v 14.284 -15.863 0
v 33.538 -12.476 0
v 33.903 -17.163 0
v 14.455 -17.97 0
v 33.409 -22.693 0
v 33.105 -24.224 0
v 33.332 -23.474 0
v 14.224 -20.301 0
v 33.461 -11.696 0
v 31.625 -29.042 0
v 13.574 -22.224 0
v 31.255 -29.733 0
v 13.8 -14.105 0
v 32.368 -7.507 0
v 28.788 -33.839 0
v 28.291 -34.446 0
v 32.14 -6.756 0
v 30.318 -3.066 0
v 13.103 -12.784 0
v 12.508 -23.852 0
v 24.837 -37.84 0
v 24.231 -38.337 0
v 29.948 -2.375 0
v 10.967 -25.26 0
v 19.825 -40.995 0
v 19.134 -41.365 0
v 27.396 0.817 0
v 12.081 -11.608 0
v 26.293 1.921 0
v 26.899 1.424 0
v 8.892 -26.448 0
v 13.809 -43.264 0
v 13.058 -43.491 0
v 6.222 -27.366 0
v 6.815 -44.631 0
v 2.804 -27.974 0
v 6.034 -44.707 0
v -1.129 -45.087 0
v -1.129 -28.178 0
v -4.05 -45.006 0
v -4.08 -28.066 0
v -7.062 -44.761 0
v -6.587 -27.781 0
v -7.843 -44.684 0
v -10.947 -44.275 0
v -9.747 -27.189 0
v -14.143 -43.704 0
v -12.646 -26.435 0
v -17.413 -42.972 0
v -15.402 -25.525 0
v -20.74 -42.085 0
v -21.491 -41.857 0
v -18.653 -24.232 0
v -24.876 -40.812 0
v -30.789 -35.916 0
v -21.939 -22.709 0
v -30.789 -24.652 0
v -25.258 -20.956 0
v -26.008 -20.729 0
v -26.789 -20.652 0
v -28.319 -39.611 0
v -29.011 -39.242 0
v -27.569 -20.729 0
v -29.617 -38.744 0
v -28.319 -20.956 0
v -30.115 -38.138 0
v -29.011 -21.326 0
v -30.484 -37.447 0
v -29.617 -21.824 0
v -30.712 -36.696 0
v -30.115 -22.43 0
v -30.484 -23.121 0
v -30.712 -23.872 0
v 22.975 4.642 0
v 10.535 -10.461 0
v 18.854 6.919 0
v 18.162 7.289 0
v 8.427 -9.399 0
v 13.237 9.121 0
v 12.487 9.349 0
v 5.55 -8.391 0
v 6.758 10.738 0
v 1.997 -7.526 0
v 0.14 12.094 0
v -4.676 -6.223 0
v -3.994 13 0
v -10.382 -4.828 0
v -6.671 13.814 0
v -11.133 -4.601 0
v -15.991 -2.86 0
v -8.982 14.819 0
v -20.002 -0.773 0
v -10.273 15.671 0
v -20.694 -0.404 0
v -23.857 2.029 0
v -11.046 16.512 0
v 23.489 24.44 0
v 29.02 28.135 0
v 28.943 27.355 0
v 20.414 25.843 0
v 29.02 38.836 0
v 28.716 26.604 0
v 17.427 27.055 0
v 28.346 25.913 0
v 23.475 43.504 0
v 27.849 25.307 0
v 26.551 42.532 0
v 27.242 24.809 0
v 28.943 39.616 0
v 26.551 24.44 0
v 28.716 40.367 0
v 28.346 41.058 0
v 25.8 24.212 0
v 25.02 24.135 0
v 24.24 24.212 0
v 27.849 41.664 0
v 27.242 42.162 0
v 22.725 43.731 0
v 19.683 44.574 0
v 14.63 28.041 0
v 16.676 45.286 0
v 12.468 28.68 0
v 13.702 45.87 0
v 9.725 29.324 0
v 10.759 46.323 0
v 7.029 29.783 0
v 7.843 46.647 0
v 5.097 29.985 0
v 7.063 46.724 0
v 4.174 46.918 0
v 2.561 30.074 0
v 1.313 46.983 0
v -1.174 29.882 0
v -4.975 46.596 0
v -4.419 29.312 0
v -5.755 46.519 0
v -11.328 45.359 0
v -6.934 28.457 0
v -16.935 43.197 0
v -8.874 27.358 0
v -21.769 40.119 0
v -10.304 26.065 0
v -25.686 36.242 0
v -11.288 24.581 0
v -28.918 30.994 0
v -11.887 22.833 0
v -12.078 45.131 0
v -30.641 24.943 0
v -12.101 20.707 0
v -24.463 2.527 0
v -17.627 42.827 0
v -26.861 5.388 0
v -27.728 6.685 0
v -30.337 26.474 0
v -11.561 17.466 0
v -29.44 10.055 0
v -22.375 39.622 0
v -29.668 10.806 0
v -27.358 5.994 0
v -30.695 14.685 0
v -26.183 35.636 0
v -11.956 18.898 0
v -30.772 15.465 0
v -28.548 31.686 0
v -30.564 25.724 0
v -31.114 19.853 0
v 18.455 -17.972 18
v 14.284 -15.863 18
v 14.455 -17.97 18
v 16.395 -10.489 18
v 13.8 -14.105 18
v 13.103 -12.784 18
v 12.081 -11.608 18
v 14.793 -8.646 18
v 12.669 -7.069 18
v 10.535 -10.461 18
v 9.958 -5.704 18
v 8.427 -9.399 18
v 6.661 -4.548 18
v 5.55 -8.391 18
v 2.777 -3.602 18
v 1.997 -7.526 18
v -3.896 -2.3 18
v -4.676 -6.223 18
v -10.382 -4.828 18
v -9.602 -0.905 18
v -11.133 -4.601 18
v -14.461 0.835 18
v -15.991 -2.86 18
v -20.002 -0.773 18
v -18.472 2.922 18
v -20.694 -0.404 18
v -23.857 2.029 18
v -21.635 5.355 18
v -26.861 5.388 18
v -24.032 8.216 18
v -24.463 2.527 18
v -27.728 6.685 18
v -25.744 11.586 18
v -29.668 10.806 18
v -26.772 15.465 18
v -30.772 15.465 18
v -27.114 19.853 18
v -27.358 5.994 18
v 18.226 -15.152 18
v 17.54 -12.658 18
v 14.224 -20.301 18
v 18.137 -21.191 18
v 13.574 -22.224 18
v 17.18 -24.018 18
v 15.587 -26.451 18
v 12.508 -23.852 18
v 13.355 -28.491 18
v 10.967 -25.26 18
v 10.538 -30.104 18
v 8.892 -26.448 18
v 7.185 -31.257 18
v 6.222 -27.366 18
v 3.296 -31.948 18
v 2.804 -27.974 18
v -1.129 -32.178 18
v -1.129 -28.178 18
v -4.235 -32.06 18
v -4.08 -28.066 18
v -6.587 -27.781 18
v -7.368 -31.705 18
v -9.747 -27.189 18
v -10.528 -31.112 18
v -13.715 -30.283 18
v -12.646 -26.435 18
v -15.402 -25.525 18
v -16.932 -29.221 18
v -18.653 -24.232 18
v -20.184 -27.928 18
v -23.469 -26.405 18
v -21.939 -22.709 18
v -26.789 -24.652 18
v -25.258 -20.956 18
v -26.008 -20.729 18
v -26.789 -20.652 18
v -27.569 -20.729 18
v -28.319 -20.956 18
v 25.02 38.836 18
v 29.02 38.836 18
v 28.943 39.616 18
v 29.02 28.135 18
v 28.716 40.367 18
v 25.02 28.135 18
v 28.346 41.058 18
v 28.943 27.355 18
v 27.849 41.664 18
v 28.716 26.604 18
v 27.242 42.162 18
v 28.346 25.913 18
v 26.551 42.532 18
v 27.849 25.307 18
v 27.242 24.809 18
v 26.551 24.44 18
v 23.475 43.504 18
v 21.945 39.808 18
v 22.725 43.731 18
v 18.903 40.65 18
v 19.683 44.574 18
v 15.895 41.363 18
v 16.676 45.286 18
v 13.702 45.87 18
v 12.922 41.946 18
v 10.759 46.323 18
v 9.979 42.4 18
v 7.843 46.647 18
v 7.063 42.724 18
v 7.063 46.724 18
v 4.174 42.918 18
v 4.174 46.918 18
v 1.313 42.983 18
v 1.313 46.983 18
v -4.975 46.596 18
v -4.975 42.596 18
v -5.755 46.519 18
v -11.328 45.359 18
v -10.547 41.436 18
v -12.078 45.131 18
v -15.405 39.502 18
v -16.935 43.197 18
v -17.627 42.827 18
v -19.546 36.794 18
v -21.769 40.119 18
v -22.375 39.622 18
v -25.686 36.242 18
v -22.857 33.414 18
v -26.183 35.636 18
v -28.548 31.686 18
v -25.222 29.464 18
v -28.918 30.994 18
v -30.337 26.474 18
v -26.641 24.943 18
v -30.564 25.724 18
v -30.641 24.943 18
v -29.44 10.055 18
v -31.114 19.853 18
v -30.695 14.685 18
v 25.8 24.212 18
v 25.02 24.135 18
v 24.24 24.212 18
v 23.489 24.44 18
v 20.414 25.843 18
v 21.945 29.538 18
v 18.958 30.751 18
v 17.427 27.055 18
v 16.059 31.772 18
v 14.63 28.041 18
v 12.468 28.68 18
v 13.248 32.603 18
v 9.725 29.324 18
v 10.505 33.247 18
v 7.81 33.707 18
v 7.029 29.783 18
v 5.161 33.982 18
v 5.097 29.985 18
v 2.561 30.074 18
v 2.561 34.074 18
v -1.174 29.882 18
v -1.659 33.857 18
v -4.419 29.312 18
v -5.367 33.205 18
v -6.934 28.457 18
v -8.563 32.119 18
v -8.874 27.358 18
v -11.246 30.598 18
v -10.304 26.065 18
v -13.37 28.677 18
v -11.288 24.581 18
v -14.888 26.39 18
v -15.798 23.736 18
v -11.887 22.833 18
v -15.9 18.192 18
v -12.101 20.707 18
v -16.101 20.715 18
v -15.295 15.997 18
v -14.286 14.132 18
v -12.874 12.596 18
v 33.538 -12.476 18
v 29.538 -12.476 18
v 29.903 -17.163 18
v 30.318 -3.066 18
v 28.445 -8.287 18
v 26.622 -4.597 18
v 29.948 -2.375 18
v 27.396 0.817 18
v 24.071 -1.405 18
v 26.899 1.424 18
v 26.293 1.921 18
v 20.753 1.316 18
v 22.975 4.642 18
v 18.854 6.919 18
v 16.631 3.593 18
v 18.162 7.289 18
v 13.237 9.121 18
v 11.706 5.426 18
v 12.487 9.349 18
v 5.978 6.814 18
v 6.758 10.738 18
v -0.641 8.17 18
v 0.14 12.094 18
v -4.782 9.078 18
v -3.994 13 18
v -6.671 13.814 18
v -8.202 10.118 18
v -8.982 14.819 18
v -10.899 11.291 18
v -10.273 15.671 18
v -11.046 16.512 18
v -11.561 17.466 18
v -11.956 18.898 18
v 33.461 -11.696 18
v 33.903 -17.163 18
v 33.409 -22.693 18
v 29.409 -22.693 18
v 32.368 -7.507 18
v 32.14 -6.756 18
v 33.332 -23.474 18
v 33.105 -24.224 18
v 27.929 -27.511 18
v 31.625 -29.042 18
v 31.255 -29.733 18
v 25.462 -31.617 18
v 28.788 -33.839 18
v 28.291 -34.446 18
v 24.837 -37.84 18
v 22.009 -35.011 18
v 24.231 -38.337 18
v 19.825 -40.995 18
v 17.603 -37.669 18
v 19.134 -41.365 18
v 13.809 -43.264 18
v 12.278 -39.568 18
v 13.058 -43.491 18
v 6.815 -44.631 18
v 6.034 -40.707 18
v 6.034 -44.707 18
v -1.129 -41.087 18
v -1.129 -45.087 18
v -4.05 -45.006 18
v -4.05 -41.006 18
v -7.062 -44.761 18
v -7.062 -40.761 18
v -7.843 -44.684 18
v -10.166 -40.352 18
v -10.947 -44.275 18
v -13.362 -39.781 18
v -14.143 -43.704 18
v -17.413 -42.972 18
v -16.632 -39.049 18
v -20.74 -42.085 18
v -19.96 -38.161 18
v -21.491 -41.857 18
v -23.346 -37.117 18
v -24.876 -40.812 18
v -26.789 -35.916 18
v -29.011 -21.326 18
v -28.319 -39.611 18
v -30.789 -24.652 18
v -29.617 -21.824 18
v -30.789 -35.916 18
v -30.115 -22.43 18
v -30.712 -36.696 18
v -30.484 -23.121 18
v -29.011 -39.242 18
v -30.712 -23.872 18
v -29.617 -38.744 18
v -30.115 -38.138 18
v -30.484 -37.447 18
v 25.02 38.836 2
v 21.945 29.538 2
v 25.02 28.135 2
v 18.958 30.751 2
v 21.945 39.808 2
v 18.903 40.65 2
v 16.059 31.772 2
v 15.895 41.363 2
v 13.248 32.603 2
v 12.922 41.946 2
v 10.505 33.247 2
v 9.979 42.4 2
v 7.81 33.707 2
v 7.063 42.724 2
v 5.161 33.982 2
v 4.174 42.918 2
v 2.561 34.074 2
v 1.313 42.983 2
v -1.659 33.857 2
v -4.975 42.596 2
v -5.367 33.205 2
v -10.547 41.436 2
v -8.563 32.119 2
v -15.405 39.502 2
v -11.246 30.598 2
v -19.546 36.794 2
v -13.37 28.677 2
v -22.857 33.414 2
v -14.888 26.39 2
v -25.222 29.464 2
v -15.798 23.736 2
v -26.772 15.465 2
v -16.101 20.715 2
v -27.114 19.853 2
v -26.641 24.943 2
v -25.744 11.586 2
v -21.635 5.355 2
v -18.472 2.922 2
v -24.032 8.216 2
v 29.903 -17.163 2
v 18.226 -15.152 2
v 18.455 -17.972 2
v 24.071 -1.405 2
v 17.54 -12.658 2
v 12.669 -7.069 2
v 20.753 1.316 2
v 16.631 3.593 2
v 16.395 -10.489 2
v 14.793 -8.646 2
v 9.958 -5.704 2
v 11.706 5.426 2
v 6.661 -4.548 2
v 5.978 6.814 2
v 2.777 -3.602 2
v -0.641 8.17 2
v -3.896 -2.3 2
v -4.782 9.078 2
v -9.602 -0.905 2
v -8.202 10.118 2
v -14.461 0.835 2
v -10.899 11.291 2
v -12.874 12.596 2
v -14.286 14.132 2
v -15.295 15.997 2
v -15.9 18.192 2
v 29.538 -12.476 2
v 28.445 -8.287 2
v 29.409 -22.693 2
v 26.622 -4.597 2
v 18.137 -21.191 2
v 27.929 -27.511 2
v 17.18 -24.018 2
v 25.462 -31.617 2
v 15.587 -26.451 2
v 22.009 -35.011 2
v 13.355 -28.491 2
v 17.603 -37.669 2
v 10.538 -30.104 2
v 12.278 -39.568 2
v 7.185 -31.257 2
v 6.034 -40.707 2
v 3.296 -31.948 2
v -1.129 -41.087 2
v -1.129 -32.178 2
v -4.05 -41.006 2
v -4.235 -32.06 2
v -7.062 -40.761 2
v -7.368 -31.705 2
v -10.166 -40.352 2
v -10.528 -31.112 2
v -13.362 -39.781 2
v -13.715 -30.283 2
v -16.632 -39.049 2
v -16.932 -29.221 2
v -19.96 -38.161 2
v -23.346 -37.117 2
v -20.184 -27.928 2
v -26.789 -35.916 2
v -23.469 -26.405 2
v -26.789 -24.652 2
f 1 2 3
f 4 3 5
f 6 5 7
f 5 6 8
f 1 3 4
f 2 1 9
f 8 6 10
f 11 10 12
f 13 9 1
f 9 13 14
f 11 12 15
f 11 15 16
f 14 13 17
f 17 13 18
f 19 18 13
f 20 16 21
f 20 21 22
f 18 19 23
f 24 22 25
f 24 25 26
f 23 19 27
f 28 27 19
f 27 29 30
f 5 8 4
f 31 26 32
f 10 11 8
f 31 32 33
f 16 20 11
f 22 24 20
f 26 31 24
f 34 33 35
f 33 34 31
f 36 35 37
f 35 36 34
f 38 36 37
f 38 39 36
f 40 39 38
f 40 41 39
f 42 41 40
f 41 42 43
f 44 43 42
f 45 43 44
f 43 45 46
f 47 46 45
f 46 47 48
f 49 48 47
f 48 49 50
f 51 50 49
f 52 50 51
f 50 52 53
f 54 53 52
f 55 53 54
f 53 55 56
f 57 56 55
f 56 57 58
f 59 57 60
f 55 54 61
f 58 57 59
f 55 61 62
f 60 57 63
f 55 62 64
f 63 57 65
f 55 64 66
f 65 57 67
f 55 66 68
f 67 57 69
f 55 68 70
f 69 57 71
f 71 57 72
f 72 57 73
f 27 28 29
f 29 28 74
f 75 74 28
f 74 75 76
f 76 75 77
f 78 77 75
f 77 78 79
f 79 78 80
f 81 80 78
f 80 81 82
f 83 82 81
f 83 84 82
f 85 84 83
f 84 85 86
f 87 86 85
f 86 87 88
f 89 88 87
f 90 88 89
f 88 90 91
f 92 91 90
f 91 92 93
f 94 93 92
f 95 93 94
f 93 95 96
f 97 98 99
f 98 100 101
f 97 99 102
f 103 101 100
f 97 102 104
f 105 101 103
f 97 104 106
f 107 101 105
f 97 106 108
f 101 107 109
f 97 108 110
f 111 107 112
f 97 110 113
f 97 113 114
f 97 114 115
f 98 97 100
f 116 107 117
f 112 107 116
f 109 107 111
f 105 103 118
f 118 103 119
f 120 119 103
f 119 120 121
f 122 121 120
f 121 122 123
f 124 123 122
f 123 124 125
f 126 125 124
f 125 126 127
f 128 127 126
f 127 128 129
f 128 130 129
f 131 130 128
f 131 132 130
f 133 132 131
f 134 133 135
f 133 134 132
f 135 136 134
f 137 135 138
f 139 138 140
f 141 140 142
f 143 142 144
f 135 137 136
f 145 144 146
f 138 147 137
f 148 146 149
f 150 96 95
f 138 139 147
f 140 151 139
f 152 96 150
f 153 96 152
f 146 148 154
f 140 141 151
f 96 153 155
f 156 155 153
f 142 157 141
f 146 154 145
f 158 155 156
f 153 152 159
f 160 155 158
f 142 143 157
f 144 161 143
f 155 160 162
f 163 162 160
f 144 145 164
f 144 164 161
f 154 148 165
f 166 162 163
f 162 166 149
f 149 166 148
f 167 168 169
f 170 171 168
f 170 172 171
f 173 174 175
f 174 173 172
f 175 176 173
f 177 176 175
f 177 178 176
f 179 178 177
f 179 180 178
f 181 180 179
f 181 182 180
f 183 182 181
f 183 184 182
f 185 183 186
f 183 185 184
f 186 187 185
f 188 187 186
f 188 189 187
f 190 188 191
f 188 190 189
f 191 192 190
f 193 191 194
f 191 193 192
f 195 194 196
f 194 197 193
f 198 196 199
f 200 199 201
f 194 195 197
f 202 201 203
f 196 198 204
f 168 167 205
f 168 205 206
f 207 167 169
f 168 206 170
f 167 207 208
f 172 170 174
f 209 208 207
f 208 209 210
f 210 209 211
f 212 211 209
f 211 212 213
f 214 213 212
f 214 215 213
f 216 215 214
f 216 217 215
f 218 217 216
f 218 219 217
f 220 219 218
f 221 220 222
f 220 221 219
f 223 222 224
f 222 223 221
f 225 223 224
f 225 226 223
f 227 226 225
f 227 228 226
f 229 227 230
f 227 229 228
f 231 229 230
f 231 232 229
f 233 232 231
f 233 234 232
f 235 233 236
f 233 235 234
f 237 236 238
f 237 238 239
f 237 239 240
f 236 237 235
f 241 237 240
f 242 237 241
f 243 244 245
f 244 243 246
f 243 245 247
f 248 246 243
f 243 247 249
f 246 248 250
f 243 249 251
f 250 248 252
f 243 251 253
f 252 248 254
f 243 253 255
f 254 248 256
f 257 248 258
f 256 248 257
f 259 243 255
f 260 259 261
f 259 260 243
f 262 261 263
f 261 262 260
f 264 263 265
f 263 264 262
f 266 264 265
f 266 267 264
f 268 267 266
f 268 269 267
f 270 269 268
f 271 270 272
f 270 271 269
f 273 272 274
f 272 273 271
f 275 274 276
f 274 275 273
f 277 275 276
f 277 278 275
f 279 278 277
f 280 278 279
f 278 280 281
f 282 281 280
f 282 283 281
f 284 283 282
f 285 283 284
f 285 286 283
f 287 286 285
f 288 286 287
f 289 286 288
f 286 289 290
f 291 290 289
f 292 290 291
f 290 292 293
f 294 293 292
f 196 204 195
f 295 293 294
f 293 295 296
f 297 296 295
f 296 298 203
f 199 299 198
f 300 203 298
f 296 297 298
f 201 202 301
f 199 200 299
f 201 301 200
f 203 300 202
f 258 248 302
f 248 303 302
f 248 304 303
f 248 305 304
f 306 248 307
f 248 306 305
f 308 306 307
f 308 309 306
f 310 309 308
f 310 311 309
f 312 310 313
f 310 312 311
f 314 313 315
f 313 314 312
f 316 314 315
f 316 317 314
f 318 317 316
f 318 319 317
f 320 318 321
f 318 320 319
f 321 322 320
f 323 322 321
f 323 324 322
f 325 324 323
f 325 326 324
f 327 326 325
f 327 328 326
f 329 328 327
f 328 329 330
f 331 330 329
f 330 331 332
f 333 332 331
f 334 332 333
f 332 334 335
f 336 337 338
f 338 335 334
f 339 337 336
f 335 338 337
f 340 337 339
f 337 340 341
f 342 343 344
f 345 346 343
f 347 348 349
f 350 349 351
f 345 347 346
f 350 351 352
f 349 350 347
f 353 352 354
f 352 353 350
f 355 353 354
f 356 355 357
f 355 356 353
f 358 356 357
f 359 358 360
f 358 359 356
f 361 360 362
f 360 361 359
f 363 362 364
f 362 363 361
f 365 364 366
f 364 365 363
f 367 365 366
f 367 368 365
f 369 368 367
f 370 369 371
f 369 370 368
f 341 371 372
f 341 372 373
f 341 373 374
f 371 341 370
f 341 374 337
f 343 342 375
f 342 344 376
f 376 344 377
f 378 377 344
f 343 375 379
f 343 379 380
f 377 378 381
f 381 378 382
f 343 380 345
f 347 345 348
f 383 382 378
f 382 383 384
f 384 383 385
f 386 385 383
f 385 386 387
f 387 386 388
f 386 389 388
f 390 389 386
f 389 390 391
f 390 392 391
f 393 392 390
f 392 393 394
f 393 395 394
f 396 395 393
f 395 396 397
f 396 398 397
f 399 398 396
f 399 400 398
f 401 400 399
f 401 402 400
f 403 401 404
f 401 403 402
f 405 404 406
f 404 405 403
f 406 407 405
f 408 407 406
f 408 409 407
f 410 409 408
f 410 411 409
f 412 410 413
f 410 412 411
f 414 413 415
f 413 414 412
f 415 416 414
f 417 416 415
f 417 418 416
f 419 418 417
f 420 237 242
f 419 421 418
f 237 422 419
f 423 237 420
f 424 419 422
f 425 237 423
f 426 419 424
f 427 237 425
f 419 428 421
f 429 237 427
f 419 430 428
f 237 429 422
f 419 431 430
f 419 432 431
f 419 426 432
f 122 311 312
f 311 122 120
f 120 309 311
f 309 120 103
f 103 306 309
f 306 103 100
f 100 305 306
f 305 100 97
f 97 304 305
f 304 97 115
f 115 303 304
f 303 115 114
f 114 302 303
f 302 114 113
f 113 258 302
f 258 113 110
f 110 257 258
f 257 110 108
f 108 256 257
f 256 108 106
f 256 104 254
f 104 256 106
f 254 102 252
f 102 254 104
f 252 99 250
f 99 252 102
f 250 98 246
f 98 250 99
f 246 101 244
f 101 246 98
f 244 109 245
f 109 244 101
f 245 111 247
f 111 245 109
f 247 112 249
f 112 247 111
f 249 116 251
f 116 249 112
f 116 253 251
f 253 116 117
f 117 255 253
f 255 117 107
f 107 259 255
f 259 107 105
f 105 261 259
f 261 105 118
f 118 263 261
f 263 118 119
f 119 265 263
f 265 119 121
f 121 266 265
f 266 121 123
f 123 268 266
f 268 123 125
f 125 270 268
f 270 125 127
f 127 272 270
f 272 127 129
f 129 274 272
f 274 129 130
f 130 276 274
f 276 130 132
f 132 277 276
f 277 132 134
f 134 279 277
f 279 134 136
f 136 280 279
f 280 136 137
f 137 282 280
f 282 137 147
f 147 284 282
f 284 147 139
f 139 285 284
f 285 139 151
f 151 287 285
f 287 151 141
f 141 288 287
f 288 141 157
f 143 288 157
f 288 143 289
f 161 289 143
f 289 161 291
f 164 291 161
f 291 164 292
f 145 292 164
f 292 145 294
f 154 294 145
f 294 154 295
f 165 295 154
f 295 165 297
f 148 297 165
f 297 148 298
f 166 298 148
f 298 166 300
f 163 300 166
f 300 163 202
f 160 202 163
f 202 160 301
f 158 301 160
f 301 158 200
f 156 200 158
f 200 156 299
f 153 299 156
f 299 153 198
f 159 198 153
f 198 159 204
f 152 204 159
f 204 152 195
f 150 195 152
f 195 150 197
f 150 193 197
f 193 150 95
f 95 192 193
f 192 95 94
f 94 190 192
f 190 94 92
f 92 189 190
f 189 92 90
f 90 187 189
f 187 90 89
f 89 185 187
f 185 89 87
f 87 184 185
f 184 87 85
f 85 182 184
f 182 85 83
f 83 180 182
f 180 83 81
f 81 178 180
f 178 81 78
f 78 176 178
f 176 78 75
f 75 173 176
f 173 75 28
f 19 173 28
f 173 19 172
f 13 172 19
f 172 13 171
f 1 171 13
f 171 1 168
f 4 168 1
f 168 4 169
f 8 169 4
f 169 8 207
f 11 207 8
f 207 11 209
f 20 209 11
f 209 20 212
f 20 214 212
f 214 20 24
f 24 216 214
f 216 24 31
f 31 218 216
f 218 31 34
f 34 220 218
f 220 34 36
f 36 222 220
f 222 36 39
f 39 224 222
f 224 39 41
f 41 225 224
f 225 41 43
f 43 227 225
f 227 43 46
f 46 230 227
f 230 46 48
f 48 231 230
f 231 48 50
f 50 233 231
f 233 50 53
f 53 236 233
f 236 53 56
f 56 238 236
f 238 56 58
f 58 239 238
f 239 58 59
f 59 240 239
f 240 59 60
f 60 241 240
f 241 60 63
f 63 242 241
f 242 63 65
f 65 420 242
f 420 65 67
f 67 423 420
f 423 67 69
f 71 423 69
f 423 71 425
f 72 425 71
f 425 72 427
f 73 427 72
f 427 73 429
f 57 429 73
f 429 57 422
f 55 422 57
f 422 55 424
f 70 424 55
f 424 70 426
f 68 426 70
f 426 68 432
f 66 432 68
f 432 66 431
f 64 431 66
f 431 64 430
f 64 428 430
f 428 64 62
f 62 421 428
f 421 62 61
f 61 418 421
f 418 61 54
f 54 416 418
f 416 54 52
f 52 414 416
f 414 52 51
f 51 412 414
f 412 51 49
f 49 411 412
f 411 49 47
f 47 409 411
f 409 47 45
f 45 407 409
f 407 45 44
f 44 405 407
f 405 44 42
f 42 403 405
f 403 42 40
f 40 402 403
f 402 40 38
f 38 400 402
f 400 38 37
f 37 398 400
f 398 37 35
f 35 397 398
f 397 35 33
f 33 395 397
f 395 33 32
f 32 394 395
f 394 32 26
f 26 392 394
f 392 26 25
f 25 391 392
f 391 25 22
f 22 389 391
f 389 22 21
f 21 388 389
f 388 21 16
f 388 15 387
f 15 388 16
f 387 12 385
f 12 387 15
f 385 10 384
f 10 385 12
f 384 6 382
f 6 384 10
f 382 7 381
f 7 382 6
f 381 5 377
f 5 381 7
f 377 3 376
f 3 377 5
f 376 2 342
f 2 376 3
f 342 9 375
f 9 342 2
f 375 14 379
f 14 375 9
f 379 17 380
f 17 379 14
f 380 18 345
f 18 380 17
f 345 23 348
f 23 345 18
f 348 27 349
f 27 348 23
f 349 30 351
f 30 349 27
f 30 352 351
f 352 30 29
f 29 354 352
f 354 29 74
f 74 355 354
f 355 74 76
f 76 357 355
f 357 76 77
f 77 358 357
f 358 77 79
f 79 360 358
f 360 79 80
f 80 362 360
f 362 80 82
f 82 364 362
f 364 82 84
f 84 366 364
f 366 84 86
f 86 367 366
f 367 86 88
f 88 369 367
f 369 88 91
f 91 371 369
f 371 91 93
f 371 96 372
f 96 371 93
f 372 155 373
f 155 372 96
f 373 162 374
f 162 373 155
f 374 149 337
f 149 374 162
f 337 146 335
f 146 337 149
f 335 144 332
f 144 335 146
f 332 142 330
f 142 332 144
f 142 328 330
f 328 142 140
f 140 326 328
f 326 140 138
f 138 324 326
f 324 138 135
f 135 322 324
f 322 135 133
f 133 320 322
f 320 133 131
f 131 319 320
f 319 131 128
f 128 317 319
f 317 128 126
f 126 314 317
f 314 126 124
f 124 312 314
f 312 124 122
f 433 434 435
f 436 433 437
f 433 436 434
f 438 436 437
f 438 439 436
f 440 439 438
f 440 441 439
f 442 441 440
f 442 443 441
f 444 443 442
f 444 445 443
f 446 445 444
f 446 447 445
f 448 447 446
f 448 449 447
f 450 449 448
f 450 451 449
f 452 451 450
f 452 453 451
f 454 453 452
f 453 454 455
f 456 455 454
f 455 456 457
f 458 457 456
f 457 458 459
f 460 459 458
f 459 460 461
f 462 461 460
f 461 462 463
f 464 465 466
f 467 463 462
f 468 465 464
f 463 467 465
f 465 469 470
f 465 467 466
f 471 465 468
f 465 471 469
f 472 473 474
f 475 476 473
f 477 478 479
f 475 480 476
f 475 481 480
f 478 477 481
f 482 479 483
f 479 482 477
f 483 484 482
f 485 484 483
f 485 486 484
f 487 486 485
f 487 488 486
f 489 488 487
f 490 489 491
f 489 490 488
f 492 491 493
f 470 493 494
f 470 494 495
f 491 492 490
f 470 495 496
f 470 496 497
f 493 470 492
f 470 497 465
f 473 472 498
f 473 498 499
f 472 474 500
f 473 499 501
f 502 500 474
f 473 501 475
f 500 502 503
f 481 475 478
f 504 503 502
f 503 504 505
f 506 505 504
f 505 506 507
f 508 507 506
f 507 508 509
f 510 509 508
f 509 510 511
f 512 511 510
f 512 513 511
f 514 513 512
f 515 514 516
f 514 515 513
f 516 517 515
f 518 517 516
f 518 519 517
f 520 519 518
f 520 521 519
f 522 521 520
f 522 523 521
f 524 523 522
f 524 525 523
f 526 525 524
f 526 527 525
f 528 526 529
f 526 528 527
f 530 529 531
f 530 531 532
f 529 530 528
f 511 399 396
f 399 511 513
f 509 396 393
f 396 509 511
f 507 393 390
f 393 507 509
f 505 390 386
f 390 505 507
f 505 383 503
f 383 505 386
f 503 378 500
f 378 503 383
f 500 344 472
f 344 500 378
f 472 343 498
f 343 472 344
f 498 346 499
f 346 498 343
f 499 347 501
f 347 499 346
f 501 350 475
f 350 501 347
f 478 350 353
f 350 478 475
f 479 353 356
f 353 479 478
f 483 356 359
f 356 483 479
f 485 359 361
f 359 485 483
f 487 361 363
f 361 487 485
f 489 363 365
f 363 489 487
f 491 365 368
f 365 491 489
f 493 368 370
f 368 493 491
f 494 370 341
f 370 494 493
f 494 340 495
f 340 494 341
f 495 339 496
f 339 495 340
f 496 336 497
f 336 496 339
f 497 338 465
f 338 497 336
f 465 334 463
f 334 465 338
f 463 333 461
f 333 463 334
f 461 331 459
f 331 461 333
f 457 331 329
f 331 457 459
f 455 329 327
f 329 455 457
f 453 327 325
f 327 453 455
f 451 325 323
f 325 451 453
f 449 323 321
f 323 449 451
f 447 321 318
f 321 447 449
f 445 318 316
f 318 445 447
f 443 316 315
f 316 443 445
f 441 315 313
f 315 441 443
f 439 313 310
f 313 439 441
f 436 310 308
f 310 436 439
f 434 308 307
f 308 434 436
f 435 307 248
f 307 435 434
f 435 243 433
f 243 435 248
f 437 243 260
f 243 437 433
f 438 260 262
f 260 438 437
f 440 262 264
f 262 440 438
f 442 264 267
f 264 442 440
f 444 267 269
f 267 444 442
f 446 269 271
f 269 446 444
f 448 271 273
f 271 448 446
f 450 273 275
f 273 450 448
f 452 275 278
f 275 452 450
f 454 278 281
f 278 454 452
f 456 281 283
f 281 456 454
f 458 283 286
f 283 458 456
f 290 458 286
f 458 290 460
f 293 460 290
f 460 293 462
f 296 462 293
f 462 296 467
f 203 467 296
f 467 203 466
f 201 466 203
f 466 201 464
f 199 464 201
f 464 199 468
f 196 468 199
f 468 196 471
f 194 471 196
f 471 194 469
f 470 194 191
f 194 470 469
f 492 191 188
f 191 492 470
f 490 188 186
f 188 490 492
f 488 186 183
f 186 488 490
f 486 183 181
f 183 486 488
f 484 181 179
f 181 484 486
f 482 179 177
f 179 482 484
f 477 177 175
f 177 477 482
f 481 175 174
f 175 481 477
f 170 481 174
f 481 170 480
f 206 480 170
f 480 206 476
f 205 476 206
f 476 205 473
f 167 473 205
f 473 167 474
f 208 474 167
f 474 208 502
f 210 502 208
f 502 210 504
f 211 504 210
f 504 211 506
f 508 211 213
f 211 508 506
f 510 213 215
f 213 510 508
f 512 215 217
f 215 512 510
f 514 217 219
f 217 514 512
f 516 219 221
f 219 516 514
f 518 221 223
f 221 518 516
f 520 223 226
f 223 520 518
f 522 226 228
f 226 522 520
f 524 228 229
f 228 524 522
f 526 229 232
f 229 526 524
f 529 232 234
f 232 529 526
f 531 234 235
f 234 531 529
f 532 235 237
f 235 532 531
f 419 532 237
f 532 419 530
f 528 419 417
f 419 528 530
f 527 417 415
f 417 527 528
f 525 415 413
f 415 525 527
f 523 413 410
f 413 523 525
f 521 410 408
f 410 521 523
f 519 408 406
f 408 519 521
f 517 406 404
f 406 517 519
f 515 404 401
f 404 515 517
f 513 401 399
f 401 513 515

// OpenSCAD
// ═══════════════════════════════════════════════════════════════
//  Caixa de Luz — Letra Inicial com Nome
//
//  parte = 1 → Base com canal para fita LED  (cor da letra)
//  parte = 2 → Tampa difusora com nome escavado  (branco/transparente)
//  parte = 3 → Letras do nome para encaixar na tampa  (cor de destaque)
// ═══════════════════════════════════════════════════════════════

letra      = is_undef(letra)      ? "S"          : letra;
nome       = is_undef(nome)       ? "Sahil"      : nome;
fonte      = is_undef(fonte)      ? "Sacramento" : fonte;
modo       = is_undef(modo)       ? "corpo"      : modo;  // "corpo" | "tampa" | "nome"

// Tamanhos
l_tam      = is_undef(l_tam)      ? 80           : l_tam;  // tamanho da letra inicial (mm)
n_tam      = is_undef(n_tam)      ? 18           : n_tam;  // tamanho do nome (mm)

// Espessuras / profundidades
esp_parede = is_undef(esp_parede) ? 4.0          : esp_parede; // paredes do canal LED
esp_fundo  = is_undef(esp_fundo)  ? 2.0          : esp_fundo;  // fundo da base
alt_canal  = is_undef(alt_canal)  ? 16           : alt_canal;  // altura interna do canal LED
esp_topo   = is_undef(esp_topo)   ? 4.0          : esp_topo;   // espessura do topo da tampa
prof_nome  = is_undef(prof_nome)  ? 2.0          : prof_nome;  // profundidade do balde do nome (< esp_topo)

// Folga de montagem tampa ↔ base (0.2–0.3 mm para encaixar sem forçar)
folga = 0.25;

// ── Formas 2D ─────────────────────────────────────────────────

module letra_2d() {
  text(letra, font=str(fonte,":style=Regular"), size=l_tam,
       halign="center", valign="center");
}

module nome_2d() {
  text(nome, font=str(fonte,":style=Regular"), size=n_tam,
       halign="center", valign="center");
}

// Exterior da base = letra expandida pela espessura das paredes
module exterior_2d() {
  minkowski() {
    letra_2d();
    circle(r=esp_parede, $fn=32);
  }
}

// Exterior da tampa = ligeiramente menor que a base para encaixar
module exterior_tampa_2d() {
  minkowski() {
    letra_2d();
    circle(r=esp_parede - folga, $fn=32);
  }
}

// ── PARTE 1 — Base com canal LED ──────────────────────────────
// Canal = interior oco na forma da letra, aberto por cima.
// Fundo sólido de esp_fundo mm.
// Fita LED desliza pelo canal e fica escondida dentro da letra.

module parte1_base() {
  difference() {
    // Sólido exterior completo
    linear_extrude(esp_fundo + alt_canal)
      exterior_2d();
    // Escavar o canal (forma da letra, do topo até ao fundo)
    translate([0, 0, esp_fundo])
      linear_extrude(alt_canal + 1)
        letra_2d();
  }
}

// ── PARTE 2 — Tampa (caixa idêntica à base, encaixa por cima) ──
// Paredes em forma de letra (fundo aberto, encaixa na base por baixo).
// Topo sólido (esp_topo mm) com um balde/tabuleiro onde o nome assenta.
// O fundo do balde é sólido — as letras coloridas são coladas lá dentro.

module nome_exterior_2d() {
  // Nome ligeiramente expandido para criar folga de encaixe no balde
  minkowski() { nome_2d(); circle(r=0.4, $fn=16); }
}

module parte2_tampa() {
  difference() {
    union() {
      // Paredes laterais (mesma forma que a base, ligeiramente menores)
      linear_extrude(alt_canal)
        difference() {
          exterior_tampa_2d();
          letra_2d();
        }
      // Topo sólido (mais espesso para aguentar o balde do nome)
      translate([0, 0, alt_canal])
        linear_extrude(esp_topo)
          exterior_tampa_2d();
    }
    // Balde do nome: recesso com fundo sólido (não corta até ao fim)
    // Profundidade = prof_nome; fundo sólido = esp_topo - prof_nome
    translate([0, 0, alt_canal + esp_topo - prof_nome])
      linear_extrude(prof_nome + 1)
        nome_exterior_2d();
  }
}

// ── PARTE 3 — Letras do nome ───────────────────────────────────
// Encaixam no escavado da tampa. Altura = prof_nome - 0.1 mm (folga).
// Imprimir na cor de destaque.

module parte3_nome() {
  // Altura ligeiramente menor que o balde para encaixar sem forçar
  linear_extrude(prof_nome - 0.2)
    nome_2d();
}

// ── Render ────────────────────────────────────────────────────

if      (modo == "corpo") parte1_base();
else if (modo == "tampa") parte2_tampa();
else                      parte3_nome();
